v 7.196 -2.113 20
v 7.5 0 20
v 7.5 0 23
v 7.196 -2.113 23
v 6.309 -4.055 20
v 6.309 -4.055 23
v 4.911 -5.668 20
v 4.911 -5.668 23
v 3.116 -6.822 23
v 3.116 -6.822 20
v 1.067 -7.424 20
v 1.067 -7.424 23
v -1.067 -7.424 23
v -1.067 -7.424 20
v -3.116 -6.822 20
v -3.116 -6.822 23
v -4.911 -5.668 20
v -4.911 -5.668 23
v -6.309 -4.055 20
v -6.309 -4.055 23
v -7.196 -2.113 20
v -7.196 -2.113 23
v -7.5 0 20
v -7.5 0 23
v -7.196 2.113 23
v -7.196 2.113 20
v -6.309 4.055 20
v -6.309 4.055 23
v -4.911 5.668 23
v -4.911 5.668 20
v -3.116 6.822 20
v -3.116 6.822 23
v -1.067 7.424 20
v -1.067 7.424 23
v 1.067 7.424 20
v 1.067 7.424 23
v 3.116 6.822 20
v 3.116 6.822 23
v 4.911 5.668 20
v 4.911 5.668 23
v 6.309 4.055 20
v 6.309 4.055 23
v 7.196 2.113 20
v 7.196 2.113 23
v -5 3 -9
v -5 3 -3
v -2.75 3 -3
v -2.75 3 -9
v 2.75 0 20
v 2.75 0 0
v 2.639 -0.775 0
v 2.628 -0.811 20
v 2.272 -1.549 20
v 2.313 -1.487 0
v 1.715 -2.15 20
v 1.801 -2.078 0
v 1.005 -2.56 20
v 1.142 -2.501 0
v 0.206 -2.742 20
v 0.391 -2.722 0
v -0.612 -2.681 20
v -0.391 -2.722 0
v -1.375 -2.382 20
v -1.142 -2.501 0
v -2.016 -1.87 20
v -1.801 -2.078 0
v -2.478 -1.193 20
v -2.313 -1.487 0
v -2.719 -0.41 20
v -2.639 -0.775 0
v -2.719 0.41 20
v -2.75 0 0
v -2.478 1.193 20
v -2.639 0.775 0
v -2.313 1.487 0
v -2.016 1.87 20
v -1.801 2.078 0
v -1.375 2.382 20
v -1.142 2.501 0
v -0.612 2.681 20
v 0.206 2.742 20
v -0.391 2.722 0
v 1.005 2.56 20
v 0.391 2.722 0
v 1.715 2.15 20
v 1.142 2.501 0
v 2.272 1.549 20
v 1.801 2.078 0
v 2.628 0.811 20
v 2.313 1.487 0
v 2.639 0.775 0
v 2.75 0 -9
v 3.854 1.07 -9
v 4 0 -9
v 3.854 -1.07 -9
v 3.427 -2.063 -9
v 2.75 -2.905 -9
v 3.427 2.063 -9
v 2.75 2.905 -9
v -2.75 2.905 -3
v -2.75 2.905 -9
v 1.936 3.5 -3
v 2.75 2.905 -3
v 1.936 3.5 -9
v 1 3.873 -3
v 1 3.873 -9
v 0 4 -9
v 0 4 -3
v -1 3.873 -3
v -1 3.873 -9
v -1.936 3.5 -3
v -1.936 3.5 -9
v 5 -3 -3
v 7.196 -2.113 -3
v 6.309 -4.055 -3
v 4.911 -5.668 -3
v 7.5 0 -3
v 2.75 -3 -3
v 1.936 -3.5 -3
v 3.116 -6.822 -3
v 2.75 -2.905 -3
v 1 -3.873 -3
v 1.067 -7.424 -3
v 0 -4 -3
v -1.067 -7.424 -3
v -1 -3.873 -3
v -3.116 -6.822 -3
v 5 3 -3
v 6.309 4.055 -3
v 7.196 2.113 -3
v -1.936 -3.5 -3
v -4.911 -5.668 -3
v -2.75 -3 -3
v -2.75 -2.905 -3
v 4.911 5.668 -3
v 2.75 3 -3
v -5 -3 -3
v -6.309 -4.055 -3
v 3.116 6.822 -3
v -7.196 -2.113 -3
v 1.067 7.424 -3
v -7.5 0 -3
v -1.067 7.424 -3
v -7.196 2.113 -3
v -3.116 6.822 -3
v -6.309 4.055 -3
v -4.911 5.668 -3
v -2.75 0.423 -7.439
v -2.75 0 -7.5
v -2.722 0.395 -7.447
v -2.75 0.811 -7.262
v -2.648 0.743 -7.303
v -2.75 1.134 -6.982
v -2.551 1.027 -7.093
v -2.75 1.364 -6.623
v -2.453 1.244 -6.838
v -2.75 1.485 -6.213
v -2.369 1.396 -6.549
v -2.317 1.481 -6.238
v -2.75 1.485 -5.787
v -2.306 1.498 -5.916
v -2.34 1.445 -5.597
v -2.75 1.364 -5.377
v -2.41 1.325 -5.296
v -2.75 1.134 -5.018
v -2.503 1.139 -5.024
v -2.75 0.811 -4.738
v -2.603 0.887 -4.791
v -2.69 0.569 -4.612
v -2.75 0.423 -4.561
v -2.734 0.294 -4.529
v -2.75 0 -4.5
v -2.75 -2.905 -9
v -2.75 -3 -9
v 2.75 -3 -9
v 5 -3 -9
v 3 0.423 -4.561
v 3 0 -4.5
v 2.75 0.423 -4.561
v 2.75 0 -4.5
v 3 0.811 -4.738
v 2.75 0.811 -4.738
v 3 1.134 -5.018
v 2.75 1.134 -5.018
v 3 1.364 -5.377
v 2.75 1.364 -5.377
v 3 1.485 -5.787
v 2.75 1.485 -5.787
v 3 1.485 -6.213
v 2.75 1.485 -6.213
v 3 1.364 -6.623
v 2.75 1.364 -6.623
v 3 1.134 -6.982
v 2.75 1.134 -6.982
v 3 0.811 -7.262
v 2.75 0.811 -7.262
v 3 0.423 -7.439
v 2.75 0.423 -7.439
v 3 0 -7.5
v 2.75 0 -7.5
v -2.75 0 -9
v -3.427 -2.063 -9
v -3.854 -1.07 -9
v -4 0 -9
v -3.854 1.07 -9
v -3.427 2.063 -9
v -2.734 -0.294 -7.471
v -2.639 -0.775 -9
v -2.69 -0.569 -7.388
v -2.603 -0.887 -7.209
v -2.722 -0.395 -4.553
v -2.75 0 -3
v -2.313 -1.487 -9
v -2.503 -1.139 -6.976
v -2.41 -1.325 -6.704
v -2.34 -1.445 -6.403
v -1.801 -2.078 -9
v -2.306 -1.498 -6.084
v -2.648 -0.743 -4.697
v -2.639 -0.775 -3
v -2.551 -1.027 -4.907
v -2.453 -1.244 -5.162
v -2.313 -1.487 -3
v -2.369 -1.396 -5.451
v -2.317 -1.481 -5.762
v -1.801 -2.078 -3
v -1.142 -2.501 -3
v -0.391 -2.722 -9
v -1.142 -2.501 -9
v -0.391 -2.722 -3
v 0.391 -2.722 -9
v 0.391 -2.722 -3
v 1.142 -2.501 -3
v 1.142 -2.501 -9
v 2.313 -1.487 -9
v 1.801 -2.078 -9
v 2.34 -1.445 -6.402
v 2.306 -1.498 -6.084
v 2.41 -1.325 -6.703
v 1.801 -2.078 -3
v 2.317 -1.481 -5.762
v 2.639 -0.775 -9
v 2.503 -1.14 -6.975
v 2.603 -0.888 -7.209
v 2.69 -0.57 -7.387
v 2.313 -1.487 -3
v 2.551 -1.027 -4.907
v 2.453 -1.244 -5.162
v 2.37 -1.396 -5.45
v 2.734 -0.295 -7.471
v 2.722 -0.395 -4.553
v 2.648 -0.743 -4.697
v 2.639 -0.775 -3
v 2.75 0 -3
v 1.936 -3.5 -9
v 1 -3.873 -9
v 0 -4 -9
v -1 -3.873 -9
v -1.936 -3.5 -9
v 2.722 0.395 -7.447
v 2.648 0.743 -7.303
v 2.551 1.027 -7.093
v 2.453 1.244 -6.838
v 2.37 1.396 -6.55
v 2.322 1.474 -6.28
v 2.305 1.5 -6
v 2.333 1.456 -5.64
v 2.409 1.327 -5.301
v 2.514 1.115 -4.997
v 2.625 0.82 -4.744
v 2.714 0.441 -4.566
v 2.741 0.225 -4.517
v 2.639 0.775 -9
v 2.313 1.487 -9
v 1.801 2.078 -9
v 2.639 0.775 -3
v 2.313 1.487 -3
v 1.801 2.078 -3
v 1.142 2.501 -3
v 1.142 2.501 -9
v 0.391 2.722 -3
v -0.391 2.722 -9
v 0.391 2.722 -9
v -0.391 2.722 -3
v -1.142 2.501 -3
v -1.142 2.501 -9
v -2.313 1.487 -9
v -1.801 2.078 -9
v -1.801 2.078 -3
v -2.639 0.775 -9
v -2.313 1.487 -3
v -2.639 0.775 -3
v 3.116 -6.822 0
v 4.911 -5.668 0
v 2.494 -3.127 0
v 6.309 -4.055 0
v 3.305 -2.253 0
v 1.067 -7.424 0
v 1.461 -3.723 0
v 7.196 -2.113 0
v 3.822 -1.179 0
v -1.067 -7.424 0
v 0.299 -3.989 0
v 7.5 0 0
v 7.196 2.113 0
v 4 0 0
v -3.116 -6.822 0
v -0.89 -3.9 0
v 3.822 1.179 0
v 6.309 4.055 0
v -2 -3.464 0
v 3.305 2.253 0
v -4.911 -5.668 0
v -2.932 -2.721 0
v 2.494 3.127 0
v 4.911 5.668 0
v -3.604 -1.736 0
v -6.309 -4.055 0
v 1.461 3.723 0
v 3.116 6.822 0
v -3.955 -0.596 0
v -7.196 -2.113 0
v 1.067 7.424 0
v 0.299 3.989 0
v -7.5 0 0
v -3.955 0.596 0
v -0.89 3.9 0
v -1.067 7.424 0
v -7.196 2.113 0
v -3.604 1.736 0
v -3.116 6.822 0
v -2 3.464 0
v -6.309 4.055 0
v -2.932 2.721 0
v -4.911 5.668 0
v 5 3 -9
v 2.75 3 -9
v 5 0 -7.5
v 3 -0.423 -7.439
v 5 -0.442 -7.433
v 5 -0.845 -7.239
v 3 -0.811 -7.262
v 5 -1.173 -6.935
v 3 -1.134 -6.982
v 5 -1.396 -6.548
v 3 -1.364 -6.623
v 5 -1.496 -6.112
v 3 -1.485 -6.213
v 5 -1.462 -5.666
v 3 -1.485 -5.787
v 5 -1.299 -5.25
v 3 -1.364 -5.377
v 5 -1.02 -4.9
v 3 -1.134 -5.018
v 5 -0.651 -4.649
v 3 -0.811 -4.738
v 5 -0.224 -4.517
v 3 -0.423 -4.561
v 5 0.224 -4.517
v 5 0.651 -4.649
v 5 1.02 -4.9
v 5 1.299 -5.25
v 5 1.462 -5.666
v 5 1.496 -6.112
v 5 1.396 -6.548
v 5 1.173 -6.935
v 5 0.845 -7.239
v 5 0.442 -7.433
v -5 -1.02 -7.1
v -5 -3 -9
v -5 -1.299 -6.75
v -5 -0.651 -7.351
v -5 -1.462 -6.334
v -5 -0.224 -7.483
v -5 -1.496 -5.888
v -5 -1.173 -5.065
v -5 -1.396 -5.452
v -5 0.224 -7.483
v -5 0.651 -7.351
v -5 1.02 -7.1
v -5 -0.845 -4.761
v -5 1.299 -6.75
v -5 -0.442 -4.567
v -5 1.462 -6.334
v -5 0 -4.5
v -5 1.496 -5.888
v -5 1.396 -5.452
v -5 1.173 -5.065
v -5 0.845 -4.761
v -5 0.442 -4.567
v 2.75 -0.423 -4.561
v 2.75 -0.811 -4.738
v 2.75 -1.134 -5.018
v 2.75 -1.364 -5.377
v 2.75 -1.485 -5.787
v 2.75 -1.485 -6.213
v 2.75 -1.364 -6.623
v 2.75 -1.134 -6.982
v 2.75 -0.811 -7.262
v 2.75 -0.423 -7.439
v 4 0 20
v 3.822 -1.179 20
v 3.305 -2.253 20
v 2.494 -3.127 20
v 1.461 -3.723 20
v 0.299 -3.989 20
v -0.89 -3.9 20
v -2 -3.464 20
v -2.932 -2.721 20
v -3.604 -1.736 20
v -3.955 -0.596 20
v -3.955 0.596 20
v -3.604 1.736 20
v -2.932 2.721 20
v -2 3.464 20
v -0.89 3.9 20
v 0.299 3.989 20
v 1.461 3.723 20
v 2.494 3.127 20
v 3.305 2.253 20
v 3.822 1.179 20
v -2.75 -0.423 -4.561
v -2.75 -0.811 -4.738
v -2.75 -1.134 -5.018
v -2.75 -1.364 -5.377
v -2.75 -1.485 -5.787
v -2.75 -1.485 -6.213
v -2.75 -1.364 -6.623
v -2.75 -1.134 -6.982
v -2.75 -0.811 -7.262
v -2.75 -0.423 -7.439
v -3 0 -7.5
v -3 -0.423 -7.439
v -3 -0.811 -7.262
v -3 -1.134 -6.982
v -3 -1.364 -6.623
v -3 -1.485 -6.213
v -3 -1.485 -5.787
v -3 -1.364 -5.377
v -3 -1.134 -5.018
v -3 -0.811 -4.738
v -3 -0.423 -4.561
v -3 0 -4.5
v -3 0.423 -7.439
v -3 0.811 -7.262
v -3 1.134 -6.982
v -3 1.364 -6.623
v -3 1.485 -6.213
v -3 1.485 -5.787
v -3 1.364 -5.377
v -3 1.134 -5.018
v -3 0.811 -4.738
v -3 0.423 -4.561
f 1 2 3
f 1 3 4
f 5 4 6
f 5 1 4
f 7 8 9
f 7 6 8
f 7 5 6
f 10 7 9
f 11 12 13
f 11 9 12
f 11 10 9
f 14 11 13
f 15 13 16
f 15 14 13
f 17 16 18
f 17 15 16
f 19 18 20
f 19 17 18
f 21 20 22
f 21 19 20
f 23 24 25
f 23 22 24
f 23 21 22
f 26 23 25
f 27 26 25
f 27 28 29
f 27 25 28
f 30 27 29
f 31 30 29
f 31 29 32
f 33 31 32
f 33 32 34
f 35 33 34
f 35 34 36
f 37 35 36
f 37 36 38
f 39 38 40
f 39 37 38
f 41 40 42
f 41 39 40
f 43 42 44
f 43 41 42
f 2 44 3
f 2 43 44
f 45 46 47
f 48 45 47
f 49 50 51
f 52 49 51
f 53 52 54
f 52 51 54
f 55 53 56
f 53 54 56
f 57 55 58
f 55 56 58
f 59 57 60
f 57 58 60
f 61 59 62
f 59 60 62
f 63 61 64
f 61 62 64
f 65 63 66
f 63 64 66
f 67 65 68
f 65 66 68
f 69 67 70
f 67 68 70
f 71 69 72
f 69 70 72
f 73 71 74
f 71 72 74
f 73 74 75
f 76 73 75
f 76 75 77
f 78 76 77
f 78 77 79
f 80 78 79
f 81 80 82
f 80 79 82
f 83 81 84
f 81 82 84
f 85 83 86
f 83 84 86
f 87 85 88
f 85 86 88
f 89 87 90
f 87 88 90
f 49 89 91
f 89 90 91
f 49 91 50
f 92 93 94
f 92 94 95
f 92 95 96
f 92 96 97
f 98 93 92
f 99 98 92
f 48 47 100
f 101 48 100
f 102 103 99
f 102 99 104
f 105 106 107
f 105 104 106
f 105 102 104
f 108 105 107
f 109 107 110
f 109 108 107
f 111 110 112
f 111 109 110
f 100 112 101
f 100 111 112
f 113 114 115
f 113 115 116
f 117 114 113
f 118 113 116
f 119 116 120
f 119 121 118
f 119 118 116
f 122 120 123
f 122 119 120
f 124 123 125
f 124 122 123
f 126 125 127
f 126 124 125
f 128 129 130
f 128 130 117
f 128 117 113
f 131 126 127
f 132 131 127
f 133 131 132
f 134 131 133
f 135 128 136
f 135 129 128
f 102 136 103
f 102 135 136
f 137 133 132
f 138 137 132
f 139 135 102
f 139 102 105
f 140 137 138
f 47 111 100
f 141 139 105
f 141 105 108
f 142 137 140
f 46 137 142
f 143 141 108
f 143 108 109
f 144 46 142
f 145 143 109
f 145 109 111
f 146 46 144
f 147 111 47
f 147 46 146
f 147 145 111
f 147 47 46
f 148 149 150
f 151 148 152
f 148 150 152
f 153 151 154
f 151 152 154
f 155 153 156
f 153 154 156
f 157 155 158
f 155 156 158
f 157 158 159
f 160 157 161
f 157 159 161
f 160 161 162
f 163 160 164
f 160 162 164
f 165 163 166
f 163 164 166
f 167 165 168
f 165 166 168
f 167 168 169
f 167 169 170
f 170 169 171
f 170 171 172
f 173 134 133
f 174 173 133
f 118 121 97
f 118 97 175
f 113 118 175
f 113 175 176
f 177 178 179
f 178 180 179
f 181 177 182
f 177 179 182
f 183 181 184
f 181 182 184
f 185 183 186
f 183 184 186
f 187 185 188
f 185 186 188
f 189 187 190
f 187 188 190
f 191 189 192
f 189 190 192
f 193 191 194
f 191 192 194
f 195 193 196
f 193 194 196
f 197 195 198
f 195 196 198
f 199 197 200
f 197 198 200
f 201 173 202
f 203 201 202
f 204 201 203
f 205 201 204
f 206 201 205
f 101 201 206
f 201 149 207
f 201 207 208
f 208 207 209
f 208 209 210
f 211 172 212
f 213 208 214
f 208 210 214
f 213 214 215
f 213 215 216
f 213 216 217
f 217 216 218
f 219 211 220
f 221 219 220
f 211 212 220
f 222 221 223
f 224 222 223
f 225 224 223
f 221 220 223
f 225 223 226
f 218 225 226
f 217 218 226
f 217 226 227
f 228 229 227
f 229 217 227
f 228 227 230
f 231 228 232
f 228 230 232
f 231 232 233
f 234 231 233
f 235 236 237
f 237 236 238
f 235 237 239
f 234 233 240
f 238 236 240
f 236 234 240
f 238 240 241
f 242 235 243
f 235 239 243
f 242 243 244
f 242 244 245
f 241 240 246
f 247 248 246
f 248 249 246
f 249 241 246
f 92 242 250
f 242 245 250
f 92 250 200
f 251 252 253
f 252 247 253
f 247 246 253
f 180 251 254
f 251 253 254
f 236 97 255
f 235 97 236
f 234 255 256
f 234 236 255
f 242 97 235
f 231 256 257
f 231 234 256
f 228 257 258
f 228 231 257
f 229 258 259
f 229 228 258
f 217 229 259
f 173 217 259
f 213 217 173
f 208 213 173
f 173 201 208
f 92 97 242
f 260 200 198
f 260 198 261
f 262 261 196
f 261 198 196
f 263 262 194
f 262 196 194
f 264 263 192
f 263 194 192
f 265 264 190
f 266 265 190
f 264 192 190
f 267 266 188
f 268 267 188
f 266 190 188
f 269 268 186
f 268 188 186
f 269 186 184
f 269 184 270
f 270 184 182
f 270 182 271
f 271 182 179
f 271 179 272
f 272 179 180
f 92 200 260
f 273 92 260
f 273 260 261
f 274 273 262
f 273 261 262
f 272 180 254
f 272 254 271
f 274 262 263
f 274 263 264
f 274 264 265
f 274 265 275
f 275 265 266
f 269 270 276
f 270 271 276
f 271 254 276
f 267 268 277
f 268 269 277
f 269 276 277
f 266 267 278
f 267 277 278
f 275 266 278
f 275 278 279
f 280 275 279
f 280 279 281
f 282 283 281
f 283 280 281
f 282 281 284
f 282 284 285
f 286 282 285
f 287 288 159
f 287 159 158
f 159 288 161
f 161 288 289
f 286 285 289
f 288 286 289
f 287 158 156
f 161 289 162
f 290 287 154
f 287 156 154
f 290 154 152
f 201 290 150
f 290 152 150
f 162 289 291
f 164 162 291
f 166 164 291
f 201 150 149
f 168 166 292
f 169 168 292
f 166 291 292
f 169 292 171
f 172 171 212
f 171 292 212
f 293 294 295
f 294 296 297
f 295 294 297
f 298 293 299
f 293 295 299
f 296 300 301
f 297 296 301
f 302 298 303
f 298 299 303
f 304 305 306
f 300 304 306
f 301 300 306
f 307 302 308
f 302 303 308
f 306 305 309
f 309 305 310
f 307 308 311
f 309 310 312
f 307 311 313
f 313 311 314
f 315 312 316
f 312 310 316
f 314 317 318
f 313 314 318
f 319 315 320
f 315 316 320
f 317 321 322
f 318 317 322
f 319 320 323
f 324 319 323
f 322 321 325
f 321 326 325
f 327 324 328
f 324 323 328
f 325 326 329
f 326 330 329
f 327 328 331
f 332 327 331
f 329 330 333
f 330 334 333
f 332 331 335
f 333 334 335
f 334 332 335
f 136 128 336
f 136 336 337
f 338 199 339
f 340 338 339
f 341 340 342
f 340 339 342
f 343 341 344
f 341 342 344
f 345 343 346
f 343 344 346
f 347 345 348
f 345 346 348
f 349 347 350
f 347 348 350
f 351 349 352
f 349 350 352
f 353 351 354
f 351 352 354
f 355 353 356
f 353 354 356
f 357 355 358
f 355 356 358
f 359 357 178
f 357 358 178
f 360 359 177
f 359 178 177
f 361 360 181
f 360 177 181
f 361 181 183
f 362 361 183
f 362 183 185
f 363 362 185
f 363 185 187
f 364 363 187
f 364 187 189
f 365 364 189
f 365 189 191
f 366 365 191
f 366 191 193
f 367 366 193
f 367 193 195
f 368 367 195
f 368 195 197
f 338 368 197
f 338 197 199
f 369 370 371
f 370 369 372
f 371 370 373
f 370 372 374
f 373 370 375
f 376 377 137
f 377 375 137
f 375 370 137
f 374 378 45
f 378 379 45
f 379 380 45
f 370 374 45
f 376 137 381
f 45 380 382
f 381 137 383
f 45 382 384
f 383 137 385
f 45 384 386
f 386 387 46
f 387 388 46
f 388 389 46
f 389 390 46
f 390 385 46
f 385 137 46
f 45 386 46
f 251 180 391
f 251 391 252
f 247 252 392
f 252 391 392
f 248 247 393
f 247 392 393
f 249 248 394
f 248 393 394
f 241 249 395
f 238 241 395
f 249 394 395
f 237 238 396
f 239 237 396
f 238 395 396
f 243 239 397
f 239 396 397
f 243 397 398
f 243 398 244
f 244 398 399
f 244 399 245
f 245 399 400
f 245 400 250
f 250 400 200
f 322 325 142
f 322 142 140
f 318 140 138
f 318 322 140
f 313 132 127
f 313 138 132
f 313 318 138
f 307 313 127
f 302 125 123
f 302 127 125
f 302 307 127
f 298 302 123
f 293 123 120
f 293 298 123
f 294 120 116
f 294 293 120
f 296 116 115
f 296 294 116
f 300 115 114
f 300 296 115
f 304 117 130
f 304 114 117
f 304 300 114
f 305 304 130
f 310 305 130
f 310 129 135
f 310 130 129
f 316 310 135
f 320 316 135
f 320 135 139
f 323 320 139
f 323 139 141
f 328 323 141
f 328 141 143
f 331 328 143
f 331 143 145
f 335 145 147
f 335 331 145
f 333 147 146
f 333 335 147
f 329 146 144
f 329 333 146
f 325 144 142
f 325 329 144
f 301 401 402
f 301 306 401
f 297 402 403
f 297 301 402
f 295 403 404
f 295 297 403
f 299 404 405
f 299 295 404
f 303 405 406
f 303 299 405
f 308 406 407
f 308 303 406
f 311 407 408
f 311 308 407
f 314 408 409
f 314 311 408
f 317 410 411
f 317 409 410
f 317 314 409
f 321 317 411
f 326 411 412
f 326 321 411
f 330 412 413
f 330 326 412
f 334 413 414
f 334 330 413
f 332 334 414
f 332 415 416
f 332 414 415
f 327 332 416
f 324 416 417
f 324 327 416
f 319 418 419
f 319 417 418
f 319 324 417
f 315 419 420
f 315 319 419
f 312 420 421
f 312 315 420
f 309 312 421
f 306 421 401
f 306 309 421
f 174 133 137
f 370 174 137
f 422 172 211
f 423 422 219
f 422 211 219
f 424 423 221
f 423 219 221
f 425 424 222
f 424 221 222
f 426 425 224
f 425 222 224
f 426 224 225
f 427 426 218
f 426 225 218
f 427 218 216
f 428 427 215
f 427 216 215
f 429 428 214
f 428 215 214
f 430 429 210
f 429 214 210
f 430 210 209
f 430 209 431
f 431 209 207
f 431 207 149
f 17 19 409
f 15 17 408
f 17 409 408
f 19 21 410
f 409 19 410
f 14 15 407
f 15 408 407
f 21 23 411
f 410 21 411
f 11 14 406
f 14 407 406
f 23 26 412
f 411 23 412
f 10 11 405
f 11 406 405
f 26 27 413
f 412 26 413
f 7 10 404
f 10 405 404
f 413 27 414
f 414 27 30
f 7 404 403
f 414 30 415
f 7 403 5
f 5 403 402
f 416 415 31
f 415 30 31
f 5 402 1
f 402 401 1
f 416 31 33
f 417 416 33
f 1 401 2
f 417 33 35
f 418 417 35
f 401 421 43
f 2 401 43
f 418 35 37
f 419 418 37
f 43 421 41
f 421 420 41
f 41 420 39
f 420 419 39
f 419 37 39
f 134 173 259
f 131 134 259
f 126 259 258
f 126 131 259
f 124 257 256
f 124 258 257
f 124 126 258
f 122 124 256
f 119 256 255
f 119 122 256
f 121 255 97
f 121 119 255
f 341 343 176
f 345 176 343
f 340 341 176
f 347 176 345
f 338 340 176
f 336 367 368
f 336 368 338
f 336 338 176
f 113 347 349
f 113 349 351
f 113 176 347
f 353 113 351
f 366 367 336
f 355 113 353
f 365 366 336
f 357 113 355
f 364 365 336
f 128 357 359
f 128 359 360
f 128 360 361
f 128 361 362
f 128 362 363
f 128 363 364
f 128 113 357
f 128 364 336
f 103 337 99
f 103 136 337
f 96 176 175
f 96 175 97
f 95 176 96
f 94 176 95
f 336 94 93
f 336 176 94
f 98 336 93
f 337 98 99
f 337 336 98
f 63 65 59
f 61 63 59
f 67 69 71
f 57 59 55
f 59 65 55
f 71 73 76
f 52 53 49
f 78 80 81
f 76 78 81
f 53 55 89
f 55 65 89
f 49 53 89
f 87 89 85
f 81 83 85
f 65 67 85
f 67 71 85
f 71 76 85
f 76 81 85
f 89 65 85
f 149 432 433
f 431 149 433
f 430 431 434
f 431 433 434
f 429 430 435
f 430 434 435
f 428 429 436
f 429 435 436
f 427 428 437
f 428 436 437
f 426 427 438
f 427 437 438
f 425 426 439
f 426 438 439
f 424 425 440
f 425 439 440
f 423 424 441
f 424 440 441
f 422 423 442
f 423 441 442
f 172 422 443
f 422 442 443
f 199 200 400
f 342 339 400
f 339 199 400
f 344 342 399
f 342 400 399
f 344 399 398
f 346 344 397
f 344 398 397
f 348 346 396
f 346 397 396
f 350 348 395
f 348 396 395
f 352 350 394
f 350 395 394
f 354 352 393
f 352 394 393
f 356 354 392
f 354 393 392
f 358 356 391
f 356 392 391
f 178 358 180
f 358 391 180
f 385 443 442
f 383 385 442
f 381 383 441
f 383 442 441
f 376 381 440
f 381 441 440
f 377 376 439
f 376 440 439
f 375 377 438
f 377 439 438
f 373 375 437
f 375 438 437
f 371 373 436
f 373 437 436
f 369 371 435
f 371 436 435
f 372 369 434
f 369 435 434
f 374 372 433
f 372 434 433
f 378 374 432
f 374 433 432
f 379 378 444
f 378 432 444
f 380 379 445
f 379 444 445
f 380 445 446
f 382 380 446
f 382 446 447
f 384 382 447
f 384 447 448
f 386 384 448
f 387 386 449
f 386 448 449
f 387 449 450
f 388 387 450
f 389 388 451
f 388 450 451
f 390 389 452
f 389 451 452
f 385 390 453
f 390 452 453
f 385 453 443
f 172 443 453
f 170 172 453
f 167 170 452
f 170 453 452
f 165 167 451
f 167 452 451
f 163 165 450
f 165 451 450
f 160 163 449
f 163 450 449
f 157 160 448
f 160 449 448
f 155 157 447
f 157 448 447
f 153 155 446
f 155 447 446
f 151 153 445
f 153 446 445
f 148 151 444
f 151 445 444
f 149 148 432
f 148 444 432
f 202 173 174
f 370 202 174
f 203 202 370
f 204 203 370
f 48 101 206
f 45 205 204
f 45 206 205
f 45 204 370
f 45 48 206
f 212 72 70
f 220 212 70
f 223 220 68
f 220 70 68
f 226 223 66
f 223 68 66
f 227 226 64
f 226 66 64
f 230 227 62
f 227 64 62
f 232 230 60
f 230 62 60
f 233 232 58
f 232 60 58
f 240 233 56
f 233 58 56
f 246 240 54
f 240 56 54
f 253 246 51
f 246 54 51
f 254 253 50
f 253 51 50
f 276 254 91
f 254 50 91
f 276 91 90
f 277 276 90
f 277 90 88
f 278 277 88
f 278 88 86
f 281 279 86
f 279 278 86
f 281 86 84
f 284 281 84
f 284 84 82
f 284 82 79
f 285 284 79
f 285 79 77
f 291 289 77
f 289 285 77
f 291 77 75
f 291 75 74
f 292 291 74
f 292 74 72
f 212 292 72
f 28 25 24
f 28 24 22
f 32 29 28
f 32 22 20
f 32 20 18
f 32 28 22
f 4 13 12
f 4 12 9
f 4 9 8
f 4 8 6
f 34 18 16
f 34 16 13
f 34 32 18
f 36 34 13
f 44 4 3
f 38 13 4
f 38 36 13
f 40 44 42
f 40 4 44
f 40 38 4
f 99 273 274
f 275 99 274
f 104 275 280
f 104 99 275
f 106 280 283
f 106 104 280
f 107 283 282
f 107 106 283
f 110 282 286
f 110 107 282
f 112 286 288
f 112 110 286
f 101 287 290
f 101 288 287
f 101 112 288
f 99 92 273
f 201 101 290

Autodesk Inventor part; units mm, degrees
ref_plane "YZ Plane" through (0, 0, 0) normal (1, 0, 0) x (0, 1, 0)
ref_plane "XZ Plane" through (0, 0, 0) normal (0, 1, 0) x (-1, 0, 0)
ref_plane "XY Plane" through (0, 0, 0) normal (0, 0, 1) x (1, 0, 0)
sketch "Sketch1" plane through (0, 0, 0) normal (0, 0, 1) x (1, 0, 0)
  circle A0 centre (0, 0) radius 2.75
  circle A1 centre (0, 0) radius 4
  dimension "d0" = 5.5
  dimension "d1" = 8
extrude "Extrusion1" add sketch "Sketch1" along normal blind 20
sketch "Sketch2" plane through (0, 0, 20) normal (0, 0, 1) x (1, 0, 0)
  circle A0 centre (0, 0) radius 7.5
  dimension "d4" = 15
extrude "Extrusion2" add sketch "Sketch2" along normal blind 3
sketch "Sketch3" plane through (0, 0, 0) normal (1, 0, 0) x (0, 1, 0)
  point P0 (0, 0)
sketch "Sketch4" plane through (0, 0, 0) normal (0, 0, -1) x (-1, 0, 0)
  circle A0 centre (0, 0) radius 2.75
  circle A1 centre (0, 0) radius 7.5
  dimension "d7" = 5.5
  dimension "d8" = 15
extrude "Extrusion3" add sketch "Sketch4" along normal blind 3
sketch "Sketch5" plane through (0, 0, -3) normal (0, 0, -1) x (-1, 0, 0)
  circle A0 centre (0, 0) radius 2.75
  circle A1 centre (0, 0) radius 4
extrude "Extrusion4" add sketch "Sketch5" along normal blind 6
sketch "Sketch6" plane through (0, 0, 0) normal (1, 0, 0) x (0, 1, 0)
  circle A0 centre (0, -6) radius 1.5
  line L0 (-4, -9) -> (4, -9) projected
  point P0 (0, 0)
  dimension "d13" = 3
  dimension "d14" = 3
extrude "Extrusion5" add sketch "Sketch6" along normal blind 6
sketch "Sketch7" plane through (6, 0, -6) normal (1, 0, 0) x (0, 0, -1)
  circle A0 centre (0, 0) radius 1.5 projected
  circle A1 centre (0, 0) radius 1.5
  point P0 (-6, 0)
  dimension "d17" = 3
extrude "Extrusion6" cut sketch "Sketch7" against normal blind 20
sketch "Sketch8" plane through (0, 0, -3) normal (0, 0, -1) x (-1, 0, 0)
  line L0 (-5, 3) -> (-2.75, 3)
  line L1 (-2.75, 3) -> (-2.75, -3)
  line L2 (-2.75, -3) -> (-5, -3)
  line L3 (-5, -3) -> (-5, 3)
  line L4 (2.75, -3) -> (5, -3)
  line L5 (5, -3) -> (5, 3)
  line L6 (5, 3) -> (2.75, 3)
  line L7 (2.75, 3) -> (2.75, -3)
  point P0 (0, 0)
  dimension "d20" = 3
  dimension "d21" = 3
  dimension "d22" = 5
  dimension "d23" = 2.75
  dimension "d24" = 2.75
  dimension "d25" = 5
extrude "Extrusion7" add sketch "Sketch8" along normal blind 6
sketch "Sketch9" plane through (5, -3, -3) normal (1, 0, 0) x (0, 0, -1)
  arc A0 (1.5, 3) -> (4.5, 3) centre (3, 3) ccw projected
  point P0 (-3, 3)
hole "Hole1" at (5, 0, -6) direction (-1, 0, 0) diameter 3 depth 8 tip angle 118
sketch "Sketch10" plane through (-5, -3, -3) normal (-1, 0, 0) x (0, 0, 1)
  circle A0 centre (-3, 3) radius 1.5 projected
  point P0 (3, 3)
hole "Hole2" at (-5, 0, -6) direction (1, 0, 0) diameter 3 depth 8 tip angle 118
thread "Thread1" size "M8x1.25" class "6g" standard "ANSI Metric M Profile" full length
properties part number "bearing v1"
